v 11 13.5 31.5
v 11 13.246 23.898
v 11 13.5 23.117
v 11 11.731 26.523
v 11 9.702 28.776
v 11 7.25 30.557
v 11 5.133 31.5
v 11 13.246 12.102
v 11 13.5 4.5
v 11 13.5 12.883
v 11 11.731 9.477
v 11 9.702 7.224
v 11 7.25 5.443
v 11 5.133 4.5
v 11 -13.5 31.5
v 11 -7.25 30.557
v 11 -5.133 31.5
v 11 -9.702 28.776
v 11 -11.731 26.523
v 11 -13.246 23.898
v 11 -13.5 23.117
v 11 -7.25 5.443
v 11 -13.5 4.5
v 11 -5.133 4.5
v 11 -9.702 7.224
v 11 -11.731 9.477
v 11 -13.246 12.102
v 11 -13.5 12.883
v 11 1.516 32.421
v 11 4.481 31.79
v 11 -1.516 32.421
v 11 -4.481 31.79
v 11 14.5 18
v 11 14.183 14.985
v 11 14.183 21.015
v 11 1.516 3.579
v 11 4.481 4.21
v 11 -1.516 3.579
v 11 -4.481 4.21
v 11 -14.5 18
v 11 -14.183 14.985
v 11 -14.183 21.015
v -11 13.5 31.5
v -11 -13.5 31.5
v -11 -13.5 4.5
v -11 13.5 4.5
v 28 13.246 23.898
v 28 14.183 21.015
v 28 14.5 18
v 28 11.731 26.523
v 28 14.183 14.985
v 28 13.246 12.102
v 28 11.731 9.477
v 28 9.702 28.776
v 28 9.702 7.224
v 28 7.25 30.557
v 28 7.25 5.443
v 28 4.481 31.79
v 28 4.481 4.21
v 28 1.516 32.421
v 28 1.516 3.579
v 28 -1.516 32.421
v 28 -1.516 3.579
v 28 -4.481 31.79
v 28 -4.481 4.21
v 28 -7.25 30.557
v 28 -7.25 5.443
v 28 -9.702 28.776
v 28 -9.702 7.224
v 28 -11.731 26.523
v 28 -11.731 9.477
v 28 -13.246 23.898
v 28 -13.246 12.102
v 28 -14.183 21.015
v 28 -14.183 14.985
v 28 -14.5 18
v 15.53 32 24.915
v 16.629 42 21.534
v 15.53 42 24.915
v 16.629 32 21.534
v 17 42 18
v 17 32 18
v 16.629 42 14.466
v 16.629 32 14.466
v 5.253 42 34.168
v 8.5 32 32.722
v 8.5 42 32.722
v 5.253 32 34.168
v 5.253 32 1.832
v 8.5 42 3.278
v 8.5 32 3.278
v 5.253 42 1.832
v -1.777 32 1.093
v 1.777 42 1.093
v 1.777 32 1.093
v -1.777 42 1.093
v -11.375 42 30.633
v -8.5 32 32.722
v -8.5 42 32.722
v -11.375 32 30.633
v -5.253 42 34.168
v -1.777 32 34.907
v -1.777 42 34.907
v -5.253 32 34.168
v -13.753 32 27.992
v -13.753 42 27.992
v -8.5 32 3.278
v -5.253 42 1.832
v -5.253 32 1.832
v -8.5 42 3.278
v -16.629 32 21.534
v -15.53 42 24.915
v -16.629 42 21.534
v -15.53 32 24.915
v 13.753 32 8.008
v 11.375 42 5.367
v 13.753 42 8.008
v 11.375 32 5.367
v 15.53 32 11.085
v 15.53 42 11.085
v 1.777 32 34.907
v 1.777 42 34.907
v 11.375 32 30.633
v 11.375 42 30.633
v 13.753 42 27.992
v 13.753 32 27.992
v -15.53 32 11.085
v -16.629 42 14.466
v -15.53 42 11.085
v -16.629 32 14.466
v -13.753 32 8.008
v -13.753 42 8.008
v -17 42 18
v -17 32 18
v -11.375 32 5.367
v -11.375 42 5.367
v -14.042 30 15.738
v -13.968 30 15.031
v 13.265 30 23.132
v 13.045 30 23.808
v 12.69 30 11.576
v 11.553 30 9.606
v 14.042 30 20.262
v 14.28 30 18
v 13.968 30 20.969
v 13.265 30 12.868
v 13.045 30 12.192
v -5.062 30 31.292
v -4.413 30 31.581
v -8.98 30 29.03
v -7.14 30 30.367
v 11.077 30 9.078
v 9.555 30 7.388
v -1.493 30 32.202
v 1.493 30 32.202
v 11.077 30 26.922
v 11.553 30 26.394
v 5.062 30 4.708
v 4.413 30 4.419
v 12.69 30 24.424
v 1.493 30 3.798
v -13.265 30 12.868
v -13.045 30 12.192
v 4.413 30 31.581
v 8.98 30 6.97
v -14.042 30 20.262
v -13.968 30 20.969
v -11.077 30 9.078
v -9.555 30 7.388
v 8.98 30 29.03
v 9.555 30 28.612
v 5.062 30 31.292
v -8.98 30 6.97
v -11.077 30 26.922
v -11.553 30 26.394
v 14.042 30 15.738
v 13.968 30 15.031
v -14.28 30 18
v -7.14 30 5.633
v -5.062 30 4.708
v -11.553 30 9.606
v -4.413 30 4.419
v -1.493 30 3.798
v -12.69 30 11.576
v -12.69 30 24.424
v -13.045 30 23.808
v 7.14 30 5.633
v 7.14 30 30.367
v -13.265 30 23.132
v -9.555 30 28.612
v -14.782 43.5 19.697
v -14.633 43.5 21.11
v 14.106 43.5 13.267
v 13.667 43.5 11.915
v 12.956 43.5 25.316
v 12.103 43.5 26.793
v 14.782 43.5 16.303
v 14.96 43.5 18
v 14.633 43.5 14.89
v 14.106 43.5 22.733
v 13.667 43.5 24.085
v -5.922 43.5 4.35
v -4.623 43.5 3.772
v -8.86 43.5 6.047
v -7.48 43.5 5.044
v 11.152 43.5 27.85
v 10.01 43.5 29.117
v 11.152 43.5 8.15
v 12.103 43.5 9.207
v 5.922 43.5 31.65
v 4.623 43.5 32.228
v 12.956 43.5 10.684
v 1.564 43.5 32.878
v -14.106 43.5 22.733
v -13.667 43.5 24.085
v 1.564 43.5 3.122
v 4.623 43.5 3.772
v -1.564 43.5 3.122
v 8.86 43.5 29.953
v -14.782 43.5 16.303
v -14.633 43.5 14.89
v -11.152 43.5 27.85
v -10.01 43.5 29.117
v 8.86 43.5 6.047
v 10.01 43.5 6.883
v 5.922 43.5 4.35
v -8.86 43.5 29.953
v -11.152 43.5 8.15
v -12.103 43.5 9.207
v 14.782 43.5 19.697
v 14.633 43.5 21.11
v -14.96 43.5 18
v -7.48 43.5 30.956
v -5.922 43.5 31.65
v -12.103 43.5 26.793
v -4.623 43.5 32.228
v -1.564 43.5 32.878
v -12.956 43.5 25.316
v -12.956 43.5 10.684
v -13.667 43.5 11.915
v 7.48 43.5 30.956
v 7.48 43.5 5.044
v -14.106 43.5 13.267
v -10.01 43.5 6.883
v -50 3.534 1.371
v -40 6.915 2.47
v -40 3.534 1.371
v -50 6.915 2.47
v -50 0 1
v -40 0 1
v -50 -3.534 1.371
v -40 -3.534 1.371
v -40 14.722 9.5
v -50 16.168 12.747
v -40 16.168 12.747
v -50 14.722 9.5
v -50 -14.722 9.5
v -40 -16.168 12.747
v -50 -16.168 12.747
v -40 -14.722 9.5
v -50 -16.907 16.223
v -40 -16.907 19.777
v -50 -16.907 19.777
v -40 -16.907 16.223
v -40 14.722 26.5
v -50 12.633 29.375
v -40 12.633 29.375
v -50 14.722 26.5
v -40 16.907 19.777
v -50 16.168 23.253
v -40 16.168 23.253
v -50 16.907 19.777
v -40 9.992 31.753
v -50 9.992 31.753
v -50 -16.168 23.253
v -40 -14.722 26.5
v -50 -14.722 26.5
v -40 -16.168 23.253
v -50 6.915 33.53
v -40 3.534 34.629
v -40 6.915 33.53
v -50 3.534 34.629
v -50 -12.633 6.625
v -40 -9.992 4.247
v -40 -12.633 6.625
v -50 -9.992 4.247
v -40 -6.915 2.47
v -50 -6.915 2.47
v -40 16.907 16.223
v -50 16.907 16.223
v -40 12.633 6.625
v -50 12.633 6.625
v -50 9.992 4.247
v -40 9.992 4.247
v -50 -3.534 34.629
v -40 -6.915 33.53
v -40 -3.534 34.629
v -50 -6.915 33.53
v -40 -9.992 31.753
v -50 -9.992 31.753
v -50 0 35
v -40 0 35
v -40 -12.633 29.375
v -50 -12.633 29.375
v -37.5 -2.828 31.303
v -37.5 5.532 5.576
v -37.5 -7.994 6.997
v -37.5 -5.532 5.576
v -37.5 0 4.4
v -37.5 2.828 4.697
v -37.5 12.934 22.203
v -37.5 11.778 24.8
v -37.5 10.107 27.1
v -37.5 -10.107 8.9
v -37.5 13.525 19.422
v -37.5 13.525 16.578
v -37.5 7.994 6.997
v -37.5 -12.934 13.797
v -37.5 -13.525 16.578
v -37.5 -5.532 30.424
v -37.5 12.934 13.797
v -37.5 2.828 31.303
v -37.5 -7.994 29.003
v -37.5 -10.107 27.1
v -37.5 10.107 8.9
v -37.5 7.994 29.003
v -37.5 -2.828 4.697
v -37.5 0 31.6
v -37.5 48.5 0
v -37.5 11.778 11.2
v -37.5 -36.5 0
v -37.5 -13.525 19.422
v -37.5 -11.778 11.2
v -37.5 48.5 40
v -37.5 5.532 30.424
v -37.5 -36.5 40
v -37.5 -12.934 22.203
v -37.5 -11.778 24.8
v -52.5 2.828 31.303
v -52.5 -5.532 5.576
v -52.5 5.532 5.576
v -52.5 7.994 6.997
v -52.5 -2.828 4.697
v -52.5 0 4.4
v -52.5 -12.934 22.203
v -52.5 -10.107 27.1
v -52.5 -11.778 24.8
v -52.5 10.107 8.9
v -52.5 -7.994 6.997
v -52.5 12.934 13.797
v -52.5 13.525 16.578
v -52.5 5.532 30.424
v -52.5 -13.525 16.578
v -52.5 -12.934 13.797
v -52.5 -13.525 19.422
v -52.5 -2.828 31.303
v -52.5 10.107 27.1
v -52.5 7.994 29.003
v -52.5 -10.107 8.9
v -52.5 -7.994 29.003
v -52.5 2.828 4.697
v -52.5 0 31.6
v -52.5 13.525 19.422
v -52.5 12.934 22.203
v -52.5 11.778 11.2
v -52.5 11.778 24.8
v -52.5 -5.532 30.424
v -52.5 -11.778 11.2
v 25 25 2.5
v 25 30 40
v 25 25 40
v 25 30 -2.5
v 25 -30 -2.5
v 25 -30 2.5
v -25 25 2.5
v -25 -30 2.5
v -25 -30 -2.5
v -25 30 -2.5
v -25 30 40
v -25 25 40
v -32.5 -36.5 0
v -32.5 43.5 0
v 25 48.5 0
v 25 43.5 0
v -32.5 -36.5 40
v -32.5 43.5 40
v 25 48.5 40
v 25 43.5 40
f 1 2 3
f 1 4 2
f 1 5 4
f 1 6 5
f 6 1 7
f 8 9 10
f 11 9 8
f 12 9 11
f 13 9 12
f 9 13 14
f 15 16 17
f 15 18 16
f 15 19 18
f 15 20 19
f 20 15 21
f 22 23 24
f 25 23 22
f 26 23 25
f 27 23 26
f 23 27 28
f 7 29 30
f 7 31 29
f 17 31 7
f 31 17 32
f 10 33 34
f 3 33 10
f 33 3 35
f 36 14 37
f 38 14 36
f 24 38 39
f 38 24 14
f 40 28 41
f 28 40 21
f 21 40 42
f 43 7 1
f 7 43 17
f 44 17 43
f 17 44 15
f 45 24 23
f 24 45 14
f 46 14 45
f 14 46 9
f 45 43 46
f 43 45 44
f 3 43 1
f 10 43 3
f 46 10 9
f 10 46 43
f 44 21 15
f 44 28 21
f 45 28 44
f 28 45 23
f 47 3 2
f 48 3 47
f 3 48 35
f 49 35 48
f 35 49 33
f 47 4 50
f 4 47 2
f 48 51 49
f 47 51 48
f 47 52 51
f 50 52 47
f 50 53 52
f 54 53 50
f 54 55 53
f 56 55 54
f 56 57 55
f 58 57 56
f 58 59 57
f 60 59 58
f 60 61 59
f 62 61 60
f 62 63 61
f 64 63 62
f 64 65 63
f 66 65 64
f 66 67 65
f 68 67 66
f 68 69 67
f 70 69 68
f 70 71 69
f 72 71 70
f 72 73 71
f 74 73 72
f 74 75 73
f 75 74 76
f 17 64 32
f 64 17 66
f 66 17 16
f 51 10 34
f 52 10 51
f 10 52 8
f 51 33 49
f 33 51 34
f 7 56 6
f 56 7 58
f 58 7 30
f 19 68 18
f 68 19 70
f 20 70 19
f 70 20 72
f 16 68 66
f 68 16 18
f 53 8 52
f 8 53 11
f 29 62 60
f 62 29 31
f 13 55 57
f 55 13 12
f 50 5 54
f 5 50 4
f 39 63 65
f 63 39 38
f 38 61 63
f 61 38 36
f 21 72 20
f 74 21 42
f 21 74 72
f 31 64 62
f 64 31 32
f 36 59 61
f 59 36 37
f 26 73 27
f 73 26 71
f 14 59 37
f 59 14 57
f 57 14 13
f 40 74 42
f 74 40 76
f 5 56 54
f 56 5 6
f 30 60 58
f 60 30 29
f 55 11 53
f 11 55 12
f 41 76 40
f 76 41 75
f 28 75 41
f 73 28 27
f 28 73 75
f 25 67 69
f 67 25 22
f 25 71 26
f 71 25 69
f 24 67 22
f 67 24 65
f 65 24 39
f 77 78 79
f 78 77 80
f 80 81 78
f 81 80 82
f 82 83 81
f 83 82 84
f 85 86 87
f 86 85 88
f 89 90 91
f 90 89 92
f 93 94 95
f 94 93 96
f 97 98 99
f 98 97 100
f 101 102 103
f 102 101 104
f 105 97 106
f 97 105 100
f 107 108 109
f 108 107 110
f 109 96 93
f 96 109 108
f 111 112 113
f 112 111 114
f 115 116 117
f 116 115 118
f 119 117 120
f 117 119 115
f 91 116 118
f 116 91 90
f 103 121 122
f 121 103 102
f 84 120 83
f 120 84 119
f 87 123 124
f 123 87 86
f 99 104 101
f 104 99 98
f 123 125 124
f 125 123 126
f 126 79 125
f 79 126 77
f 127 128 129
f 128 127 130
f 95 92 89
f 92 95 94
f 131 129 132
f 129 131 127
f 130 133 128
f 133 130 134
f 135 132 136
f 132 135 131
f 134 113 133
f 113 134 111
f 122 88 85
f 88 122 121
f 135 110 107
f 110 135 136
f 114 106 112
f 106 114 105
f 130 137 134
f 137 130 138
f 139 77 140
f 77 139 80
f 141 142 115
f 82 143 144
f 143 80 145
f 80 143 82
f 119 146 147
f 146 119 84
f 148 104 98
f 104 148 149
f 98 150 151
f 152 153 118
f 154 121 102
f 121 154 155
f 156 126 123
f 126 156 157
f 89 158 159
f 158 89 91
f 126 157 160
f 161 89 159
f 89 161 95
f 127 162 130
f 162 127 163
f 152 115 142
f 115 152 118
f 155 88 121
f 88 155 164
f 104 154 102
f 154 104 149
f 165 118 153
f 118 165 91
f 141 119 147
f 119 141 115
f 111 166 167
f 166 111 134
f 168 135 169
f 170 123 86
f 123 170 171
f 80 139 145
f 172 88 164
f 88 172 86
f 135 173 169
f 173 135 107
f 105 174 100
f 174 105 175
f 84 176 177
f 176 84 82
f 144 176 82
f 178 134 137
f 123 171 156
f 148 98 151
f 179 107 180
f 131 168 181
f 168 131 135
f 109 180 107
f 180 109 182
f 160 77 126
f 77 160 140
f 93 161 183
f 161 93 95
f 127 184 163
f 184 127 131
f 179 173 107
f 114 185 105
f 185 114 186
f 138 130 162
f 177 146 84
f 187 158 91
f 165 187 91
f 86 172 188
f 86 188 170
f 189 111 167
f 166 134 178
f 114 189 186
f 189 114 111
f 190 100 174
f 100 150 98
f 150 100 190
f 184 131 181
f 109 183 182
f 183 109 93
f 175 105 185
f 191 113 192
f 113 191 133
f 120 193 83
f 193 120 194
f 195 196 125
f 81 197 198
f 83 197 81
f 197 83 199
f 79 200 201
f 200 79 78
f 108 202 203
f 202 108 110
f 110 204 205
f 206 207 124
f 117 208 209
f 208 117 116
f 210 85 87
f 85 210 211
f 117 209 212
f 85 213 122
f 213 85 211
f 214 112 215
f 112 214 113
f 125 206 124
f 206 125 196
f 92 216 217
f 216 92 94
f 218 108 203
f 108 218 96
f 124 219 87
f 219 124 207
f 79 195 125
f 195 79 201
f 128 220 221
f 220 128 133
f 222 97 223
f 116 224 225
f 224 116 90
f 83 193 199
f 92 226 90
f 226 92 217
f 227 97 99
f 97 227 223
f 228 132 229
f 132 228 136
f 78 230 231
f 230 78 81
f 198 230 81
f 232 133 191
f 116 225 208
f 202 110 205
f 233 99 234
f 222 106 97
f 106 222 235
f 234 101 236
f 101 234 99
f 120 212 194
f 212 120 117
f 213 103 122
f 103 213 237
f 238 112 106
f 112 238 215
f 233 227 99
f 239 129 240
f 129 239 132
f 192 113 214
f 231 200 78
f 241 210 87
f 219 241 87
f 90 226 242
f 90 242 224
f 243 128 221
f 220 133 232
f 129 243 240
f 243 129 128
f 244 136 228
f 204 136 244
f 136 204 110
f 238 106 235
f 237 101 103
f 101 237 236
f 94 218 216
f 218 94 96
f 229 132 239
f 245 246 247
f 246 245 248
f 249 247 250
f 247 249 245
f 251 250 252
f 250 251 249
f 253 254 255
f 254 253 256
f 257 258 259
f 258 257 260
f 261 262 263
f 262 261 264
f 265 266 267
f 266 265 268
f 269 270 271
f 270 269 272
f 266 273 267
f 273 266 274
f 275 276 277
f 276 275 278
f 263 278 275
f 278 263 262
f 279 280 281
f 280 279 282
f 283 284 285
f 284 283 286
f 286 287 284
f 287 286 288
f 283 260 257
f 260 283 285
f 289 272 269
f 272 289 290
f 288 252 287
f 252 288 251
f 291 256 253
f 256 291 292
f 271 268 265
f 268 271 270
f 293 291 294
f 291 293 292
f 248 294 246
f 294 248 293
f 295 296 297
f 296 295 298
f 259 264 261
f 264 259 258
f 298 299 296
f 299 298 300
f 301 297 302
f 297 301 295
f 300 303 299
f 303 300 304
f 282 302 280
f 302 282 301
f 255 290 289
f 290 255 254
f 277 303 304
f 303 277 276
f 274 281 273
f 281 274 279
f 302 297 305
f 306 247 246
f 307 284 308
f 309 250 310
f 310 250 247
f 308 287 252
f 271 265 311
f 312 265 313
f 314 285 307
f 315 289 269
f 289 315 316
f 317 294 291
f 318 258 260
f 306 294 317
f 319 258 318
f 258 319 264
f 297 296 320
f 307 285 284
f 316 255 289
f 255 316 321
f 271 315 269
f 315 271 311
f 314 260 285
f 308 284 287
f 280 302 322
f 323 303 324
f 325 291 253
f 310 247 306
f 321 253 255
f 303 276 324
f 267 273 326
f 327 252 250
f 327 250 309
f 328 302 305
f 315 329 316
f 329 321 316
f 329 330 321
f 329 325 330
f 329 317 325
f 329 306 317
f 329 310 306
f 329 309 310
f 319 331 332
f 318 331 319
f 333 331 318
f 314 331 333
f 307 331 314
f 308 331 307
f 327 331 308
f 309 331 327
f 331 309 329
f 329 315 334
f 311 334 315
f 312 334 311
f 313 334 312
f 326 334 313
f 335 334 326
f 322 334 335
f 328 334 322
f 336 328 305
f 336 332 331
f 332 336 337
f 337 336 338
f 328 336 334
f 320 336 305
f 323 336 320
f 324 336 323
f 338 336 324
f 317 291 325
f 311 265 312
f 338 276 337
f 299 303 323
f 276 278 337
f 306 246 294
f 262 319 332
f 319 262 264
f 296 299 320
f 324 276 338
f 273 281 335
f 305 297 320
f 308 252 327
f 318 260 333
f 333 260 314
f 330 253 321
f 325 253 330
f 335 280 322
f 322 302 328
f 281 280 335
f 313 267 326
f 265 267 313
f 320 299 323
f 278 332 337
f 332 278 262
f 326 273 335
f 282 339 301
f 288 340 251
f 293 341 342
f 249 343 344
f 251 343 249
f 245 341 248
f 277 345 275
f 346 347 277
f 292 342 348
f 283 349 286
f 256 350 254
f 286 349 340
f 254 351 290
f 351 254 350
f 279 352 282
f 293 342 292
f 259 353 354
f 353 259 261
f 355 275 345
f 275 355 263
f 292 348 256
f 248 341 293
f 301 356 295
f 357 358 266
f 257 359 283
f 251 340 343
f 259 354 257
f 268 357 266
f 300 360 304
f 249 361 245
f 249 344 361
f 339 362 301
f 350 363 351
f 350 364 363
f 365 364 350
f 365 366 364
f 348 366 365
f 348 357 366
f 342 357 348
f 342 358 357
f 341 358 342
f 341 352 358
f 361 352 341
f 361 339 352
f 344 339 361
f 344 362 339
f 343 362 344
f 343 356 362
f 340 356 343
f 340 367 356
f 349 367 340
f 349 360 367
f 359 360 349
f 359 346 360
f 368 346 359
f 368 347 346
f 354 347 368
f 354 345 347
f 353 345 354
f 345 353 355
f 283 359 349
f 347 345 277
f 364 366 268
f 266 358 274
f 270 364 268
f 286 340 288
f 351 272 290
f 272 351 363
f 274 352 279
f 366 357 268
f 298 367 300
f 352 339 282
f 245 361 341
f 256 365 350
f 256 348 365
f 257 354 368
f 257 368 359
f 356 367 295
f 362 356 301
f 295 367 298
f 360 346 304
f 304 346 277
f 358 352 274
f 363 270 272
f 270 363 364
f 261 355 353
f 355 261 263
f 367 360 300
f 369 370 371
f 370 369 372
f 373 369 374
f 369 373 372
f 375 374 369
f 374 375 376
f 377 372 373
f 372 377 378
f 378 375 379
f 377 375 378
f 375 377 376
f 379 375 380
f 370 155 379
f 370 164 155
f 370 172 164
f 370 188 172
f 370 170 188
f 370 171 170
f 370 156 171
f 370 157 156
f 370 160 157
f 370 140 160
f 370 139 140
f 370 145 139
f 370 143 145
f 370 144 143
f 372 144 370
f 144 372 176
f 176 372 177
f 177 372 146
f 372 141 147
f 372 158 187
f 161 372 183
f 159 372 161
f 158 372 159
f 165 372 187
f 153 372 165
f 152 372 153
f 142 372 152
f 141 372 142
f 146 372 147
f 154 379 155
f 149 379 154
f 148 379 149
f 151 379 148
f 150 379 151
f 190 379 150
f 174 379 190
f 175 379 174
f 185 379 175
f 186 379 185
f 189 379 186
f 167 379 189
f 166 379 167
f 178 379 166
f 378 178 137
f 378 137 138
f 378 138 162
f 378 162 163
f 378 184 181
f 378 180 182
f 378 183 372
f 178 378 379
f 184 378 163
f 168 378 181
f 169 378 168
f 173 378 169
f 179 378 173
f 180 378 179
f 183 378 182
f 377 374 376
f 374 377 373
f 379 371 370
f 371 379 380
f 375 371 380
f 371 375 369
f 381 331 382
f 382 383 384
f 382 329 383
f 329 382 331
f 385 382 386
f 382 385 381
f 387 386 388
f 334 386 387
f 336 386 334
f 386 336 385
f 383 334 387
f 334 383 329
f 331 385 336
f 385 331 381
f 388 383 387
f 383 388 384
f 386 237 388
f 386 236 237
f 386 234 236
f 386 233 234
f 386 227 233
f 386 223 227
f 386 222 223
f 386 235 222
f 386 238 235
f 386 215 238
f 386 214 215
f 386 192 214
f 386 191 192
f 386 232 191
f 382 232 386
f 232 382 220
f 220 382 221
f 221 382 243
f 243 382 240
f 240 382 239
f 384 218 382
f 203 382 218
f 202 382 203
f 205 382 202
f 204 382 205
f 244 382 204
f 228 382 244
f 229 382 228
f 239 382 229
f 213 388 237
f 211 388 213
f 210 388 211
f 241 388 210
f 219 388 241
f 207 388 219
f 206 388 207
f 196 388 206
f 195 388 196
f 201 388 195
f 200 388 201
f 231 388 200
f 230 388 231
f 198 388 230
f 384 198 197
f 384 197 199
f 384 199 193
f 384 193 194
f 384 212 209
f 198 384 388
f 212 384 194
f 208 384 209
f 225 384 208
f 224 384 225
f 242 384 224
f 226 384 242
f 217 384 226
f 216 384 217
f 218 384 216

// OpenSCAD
module ximea_camera()
{
    // body
    cube([22, 27, 27], center = true);

    // lens
    translate([11, 0, 0]) {
        rotate([90, 0, 90]) {
            cylinder(17, 14.5, 14.5);
        }
    }
};

module gimbal_motor()
{
    inner_length = 10.0;
    taper_length = 2.5;
    diameter = 34.0;

    // main body
    cylinder(inner_length, diameter / 2.0, diameter / 2.0, center = true);

    // top taper
    translate([0, 0, inner_length / 2.0]) {
        cylinder(taper_length, diameter / 2.0, diameter / 2.5);
    }

    // bottom taper
    translate([0, 0, -inner_length / 2.0]) {
        rotate([180, 0, 0]) {
            cylinder(taper_length, diameter / 2.0, diameter / 2.5);
        }
    }
};

module gimbal_bar(width, depth, height, thickness)
{
    // bottom plate
    cube([depth, width, thickness], center = true);

    /* // right vertical plate */
    /* translate([-depth / 2.0, -width / 2.0]) { */
    /*     cube([depth, thickness, height]); */
    /* } */

    // left vertical plate
    translate([-depth / 2.0, width / 2.0 - thickness]) {
        cube([depth, thickness, height]);
    }
};


// run
translate([0, 0, 18]) {
    color([1, 0, 0]) {
        ximea_camera();
    }
};

// pitch motor
translate([0, 37, 18]) {
    rotate([90, 0, 0]) {
        color([0, 1, 0]) {
            gimbal_motor();
        }
    }
}

// roll motor
translate([-45, 0, 18]) {
    rotate([0, 90, 0]) {
        color([0, 1, 0]) {
            gimbal_motor();
        }
    }
}

// pitch bar
translate([0, 0, 0]) {
    gimbal_bar(60, 50, 40, 5);
}

// roll bar
translate([-35, 6, 20]) {
    rotate([0, 90, 0]) {
        gimbal_bar(85, 40, 60, 5);
    }
}
